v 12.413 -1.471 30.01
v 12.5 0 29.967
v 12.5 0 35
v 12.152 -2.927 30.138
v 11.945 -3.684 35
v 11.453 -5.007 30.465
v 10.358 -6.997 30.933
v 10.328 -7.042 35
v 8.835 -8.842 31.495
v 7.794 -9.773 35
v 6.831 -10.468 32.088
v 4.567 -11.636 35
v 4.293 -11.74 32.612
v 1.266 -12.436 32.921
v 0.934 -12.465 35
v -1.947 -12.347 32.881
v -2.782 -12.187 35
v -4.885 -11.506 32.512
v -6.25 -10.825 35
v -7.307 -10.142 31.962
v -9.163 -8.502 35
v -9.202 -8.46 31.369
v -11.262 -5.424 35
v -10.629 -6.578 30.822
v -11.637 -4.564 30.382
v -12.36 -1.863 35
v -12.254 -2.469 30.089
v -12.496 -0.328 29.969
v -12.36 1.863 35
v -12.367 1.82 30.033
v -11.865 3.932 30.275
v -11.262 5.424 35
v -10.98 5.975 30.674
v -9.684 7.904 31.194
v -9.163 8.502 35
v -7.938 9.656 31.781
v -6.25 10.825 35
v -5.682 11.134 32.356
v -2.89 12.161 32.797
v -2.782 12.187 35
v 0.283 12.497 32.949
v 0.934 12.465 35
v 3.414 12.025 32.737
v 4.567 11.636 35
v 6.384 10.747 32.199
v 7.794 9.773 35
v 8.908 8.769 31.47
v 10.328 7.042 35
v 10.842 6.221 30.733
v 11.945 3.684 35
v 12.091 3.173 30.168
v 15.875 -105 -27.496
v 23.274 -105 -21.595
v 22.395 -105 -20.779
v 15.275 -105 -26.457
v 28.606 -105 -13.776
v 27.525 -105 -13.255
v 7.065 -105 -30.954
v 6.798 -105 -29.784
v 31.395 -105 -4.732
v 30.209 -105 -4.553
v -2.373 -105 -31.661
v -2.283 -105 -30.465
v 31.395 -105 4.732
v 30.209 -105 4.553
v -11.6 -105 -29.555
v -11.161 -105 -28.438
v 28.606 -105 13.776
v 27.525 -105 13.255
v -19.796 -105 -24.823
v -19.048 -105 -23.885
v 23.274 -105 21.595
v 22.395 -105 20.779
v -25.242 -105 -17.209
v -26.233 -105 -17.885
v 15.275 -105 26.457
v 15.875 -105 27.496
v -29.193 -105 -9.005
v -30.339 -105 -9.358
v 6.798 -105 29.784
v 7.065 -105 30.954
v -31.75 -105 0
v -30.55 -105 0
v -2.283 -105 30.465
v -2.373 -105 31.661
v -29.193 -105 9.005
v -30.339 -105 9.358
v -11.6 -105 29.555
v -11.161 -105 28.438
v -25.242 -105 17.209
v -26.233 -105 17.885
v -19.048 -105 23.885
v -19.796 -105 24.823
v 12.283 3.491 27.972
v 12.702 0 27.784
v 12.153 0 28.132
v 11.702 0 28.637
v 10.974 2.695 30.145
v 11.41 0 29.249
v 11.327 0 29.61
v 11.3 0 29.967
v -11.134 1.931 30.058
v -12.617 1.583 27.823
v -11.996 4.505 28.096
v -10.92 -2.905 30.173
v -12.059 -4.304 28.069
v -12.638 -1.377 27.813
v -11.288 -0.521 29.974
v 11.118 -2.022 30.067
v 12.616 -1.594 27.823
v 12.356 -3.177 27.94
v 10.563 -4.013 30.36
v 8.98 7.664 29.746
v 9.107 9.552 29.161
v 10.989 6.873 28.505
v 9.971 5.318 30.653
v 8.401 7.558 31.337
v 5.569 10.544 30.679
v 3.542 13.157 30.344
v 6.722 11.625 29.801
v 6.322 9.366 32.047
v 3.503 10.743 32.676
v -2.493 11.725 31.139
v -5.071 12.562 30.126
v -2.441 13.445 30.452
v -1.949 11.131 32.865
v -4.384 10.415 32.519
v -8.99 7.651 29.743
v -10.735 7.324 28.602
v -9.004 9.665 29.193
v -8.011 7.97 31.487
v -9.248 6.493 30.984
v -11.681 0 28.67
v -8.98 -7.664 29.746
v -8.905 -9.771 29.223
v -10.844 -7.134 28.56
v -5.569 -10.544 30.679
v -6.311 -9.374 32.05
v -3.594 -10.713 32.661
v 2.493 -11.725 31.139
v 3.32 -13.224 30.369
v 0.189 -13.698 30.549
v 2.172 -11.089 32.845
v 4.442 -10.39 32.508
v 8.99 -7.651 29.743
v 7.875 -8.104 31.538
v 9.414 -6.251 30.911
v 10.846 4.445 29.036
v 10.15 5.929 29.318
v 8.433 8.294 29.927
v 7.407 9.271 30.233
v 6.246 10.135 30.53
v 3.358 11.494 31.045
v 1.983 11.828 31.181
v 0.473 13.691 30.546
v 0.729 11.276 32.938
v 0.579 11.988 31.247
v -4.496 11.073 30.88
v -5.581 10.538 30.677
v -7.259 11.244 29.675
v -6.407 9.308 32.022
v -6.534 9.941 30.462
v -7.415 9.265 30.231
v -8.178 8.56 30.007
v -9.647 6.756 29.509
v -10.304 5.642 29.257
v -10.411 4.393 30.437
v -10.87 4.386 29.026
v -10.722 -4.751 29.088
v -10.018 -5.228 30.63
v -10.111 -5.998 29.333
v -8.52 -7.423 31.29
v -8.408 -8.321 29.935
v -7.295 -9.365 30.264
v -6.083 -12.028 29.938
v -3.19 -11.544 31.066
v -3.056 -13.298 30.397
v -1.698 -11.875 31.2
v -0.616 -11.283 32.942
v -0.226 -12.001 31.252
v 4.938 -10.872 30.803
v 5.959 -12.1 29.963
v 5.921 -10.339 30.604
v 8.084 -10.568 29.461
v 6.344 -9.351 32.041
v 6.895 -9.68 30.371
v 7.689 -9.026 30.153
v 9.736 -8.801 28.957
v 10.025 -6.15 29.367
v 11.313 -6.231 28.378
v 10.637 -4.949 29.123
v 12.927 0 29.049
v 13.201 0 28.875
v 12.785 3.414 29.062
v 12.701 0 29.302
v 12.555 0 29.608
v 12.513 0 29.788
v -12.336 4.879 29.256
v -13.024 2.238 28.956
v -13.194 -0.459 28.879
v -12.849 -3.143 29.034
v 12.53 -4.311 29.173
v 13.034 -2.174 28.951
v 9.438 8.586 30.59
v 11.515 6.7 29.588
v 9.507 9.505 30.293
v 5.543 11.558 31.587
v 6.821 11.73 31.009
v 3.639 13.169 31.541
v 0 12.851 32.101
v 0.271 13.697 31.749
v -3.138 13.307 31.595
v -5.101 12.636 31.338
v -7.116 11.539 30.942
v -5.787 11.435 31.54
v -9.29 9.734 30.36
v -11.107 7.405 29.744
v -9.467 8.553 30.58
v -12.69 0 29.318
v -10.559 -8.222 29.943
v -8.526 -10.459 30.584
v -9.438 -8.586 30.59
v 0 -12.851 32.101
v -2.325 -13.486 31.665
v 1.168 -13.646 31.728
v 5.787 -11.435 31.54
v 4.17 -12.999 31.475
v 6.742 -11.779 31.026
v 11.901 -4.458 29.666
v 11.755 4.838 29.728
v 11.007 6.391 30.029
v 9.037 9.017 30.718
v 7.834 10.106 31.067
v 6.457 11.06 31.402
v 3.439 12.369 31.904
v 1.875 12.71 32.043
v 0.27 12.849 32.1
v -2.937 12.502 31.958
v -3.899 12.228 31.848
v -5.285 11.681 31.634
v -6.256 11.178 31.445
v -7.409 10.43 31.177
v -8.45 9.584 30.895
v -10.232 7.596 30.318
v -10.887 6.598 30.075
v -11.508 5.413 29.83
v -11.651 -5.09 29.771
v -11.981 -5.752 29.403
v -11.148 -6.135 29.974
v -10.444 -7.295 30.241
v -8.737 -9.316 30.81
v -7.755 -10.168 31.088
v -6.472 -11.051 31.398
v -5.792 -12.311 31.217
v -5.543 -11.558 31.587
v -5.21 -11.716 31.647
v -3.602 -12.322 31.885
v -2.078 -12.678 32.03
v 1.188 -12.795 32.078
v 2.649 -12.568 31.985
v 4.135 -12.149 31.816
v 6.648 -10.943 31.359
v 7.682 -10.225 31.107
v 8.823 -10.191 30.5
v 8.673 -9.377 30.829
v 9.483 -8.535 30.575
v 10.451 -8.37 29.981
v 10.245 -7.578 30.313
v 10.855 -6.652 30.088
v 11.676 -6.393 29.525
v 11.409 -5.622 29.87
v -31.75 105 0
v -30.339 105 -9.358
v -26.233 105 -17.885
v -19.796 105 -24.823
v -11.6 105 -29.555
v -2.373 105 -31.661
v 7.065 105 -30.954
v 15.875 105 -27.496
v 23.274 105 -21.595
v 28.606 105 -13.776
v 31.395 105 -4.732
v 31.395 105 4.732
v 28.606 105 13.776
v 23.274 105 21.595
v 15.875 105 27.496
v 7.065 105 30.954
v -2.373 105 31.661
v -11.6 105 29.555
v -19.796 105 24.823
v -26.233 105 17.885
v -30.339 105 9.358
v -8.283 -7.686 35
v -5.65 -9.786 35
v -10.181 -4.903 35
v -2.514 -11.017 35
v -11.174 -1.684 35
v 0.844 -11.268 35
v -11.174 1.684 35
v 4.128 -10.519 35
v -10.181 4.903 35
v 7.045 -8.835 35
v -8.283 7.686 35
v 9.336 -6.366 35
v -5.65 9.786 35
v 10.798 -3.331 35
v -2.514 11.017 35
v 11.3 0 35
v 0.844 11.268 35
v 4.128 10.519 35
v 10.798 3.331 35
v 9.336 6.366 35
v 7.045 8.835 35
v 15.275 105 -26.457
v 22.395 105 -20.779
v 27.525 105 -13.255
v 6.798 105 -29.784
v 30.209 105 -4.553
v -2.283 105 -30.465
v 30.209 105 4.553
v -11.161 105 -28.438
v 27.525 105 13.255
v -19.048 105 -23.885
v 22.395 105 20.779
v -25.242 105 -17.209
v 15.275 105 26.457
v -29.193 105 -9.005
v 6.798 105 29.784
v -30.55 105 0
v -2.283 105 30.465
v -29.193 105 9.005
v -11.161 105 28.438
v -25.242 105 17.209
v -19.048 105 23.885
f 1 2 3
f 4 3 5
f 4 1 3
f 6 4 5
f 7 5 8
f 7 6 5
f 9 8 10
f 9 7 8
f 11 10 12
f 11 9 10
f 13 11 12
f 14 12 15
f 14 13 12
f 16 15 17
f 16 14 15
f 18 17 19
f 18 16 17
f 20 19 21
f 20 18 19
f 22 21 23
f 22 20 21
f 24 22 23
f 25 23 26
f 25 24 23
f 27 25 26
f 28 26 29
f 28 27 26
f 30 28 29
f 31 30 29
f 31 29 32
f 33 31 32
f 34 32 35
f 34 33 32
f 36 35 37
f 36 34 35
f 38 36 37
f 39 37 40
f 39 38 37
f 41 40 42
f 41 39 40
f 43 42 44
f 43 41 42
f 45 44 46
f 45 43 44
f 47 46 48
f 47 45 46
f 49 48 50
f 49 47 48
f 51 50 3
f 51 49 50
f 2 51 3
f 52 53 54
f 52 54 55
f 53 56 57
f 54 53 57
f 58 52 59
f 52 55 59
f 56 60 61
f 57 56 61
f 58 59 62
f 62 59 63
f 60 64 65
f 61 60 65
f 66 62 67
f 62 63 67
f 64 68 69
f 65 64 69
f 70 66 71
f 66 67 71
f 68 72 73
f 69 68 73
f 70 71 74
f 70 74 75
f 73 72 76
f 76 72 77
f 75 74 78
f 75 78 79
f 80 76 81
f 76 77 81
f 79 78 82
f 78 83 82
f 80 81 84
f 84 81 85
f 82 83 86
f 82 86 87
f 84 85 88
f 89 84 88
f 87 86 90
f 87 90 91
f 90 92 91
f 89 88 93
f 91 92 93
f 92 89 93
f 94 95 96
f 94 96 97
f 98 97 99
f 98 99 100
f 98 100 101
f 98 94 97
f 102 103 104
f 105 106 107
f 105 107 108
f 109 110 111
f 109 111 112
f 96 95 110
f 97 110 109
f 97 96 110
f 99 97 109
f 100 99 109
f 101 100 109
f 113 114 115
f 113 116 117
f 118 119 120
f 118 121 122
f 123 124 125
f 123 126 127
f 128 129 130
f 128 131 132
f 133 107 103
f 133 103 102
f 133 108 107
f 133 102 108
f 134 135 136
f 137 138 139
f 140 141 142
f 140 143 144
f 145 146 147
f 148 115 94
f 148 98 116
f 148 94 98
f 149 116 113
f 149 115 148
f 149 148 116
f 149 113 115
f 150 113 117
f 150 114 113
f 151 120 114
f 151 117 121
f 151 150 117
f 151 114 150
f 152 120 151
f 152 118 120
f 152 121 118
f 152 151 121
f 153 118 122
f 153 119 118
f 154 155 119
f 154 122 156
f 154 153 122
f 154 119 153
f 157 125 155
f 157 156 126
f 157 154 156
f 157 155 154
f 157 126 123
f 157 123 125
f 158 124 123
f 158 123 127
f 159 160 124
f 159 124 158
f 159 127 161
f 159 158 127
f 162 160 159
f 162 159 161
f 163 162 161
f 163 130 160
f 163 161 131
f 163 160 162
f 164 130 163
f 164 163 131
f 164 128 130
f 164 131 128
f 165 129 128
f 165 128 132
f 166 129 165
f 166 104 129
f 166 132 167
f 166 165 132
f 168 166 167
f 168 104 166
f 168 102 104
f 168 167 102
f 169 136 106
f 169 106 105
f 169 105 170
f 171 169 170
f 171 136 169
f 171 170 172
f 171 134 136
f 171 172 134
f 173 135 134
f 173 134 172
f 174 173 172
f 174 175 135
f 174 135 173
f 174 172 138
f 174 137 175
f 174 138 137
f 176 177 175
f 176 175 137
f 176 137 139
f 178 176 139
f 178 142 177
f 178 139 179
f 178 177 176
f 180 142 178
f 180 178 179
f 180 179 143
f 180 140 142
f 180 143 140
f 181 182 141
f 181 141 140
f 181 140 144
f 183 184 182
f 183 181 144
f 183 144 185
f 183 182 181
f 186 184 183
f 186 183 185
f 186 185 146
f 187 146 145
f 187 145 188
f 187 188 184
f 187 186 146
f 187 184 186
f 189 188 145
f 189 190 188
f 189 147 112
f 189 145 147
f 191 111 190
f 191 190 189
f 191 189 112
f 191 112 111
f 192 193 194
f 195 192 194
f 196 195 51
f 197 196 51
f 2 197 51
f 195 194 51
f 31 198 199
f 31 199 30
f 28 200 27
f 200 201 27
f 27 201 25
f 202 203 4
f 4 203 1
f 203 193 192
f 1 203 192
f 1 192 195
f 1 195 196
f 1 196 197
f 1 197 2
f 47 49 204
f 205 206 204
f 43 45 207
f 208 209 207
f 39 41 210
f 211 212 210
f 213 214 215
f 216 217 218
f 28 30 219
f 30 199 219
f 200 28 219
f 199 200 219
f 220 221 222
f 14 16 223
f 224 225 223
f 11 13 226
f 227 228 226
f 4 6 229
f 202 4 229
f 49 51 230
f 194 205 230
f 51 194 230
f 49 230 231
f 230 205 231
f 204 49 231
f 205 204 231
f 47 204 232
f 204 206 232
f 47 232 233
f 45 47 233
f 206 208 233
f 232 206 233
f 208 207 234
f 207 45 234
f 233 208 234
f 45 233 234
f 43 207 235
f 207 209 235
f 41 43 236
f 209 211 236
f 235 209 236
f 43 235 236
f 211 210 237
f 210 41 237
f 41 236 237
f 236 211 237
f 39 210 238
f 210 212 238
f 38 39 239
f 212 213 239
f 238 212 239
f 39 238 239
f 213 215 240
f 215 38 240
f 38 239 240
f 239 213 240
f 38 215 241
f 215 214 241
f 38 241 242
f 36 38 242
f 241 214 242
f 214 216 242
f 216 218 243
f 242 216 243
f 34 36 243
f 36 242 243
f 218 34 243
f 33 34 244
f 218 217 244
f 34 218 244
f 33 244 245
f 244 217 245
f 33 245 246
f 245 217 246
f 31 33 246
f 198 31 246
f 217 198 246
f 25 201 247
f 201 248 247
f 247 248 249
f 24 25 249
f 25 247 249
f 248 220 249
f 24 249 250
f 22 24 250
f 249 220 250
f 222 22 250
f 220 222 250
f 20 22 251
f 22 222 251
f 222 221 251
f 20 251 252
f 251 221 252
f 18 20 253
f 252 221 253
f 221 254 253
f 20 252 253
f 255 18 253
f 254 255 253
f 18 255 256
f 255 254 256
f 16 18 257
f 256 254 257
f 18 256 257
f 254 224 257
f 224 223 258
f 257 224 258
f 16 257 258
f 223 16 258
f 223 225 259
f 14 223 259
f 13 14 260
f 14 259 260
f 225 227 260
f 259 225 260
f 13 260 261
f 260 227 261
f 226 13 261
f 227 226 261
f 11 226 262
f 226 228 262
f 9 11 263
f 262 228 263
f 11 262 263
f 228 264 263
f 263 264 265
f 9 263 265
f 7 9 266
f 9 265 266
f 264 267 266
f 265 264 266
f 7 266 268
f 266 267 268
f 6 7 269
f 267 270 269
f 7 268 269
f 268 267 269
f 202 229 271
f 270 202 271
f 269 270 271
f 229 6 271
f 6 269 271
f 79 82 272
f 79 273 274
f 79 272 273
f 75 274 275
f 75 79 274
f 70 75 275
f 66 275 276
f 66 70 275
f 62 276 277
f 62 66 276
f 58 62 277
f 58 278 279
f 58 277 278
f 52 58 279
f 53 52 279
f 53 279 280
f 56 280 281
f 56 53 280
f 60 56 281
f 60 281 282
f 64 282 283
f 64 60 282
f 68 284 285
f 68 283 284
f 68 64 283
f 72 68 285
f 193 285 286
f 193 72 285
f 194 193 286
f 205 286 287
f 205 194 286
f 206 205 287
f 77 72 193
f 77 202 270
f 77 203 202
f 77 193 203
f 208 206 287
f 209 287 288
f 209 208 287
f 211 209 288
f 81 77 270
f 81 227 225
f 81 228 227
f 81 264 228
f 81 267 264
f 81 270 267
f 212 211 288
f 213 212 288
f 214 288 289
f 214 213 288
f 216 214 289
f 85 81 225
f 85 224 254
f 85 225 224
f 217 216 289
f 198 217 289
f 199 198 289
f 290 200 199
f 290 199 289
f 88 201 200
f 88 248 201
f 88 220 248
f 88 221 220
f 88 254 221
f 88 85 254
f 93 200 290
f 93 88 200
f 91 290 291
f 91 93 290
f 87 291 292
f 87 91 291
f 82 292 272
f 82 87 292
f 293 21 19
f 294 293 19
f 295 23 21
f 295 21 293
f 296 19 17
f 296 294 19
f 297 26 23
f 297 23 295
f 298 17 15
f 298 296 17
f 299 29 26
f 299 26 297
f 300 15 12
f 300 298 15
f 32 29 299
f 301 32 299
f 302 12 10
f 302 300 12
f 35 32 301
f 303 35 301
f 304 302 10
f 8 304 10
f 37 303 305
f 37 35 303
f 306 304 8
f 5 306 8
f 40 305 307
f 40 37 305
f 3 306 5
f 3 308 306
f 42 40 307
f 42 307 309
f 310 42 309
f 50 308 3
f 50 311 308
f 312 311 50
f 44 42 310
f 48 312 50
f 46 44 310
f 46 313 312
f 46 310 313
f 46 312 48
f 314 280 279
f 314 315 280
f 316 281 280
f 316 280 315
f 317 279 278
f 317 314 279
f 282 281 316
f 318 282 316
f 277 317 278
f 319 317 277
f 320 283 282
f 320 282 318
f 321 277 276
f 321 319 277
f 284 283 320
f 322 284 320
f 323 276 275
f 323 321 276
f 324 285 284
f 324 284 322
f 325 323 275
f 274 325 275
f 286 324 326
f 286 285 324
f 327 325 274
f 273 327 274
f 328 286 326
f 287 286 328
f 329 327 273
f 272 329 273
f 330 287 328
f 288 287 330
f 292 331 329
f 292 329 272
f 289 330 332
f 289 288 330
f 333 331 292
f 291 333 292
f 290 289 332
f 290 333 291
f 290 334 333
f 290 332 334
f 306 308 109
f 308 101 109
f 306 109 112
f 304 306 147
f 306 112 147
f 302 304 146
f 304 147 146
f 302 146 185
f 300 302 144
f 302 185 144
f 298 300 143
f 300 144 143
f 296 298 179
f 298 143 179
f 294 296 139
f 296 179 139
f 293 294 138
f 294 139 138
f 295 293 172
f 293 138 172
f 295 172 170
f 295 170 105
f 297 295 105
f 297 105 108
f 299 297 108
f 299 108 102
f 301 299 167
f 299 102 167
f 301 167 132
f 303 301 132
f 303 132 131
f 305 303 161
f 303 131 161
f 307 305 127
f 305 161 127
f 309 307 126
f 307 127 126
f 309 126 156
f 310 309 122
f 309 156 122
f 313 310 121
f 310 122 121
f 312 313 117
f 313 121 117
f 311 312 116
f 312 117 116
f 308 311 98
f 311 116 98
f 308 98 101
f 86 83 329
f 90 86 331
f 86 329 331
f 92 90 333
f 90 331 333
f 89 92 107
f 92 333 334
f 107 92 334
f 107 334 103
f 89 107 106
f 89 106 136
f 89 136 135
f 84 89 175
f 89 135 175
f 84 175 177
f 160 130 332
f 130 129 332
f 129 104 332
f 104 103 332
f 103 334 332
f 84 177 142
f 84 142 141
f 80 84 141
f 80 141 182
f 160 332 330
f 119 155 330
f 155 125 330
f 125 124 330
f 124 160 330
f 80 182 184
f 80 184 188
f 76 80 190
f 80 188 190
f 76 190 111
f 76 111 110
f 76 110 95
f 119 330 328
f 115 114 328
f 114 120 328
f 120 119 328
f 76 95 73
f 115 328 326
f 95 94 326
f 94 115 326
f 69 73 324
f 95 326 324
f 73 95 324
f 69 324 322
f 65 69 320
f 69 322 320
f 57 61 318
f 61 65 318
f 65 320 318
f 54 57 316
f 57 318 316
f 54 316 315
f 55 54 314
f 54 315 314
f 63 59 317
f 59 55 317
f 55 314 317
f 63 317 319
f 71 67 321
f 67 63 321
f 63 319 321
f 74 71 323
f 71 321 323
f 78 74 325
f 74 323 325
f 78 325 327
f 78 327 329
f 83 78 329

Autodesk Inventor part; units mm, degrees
ref_plane "YZ Plane" through (0, 0, 0) normal (1, 0, 0) x (0, 1, 0)
ref_plane "XZ Plane" through (0, 0, 0) normal (0, 1, 0) x (-1, 0, 0)
ref_plane "XY Plane" through (0, 0, 0) normal (0, 0, 1) x (1, 0, 0)
sketch "Szkic8" plane through (0, 0, 0) normal (0, 1, 0) x (-1, 0, 0)
  circle A0 centre (0, 0) radius 31.75
  circle A1 centre (0, 0) radius 30.55
  dimension "d53" = 63.5
  dimension "d54" = 1.2
extrude "Wyciągnięcie proste2" add sketch "Szkic8" along normal mid plane 210
sketch "Szkic13" plane through (0, 0, 0) normal (0, 0, 1) x (1, 0, 0)
  circle A0 centre (0, 0) radius 12.5
  circle A1 centre (0, 0) radius 11.3
  dimension "d67" = 25
  dimension "d68" = 1.2
extrude "Wyciągnięcie proste6" add sketch "Szkic13" along normal blind 35
sketch "Szkic14" plane through (0, 0, 35) normal (0, 0, 1) x (1, 0, 0)
  circle A0 centre (0, 0) radius 11.3 projected
extrude "Wyciągnięcie proste7" cut sketch "Szkic14" against normal blind 35
sketch "Szkic15" plane through (0, -105, 0) normal (0, -1, 0) x (1, 0, 0)
  circle A0 centre (0, 0) radius 30.55 projected
extrude "Wyciągnięcie proste8" cut sketch "Szkic15" against normal blind 210
fillet "Zaokrąglenie3" radius 1.2 2 edges at (-0.0043, 12.5, 31.75) (0.003, -12.5, 31.75)
fillet "Zaokrąglenie4" radius 2.4 2 edges at (-0.002, -11.3, 30.55) (-0.0004, 11.3, 30.55)
equation "\"d53\" = OD"
equation "\"d54\" = THK"
equation "\"d55\" = L1"
equation "\"d67\" = OD2"
equation "\"d68\" = THK"
equation "\"d69\" = L2"
equation "\"d71\" = L2"
equation "\"d73\" = L1"
equation "\"d75\" = THK"
equation "\"d76\" = 2 * THK"
equation "\"SzerokośćGięciaPodcięcia\" = Grubość"
equation "\"RozmiarPodcięciaNarożnika\" = 4 * Grubość"
equation "\"PromieńPrzejścia\" = PromieńGięcia"
equation "\"Rozmiar_promienia_Jacobiego\" = PromieńGięcia"
equation "\"Wielk_odstępu\" = Grubość"
equation "\"d2\" = PromieńGięcia"
equation "\"d23\" = PromieńGięcia"
equation "\"OD\" = 63.5"
equation "\"THK\" = 1.2"
equation "\"L1\" = 210"
equation "\"L2\" = 35"
equation "\"OD2\" = 25"
equation "\"Grubość\" = 1.5"
equation "\"PromieńGięcia\" = 3"
properties part number "Trójnik red. krótki  Ø63,5 25 63,5 s=1,2 L=210" material "304"
